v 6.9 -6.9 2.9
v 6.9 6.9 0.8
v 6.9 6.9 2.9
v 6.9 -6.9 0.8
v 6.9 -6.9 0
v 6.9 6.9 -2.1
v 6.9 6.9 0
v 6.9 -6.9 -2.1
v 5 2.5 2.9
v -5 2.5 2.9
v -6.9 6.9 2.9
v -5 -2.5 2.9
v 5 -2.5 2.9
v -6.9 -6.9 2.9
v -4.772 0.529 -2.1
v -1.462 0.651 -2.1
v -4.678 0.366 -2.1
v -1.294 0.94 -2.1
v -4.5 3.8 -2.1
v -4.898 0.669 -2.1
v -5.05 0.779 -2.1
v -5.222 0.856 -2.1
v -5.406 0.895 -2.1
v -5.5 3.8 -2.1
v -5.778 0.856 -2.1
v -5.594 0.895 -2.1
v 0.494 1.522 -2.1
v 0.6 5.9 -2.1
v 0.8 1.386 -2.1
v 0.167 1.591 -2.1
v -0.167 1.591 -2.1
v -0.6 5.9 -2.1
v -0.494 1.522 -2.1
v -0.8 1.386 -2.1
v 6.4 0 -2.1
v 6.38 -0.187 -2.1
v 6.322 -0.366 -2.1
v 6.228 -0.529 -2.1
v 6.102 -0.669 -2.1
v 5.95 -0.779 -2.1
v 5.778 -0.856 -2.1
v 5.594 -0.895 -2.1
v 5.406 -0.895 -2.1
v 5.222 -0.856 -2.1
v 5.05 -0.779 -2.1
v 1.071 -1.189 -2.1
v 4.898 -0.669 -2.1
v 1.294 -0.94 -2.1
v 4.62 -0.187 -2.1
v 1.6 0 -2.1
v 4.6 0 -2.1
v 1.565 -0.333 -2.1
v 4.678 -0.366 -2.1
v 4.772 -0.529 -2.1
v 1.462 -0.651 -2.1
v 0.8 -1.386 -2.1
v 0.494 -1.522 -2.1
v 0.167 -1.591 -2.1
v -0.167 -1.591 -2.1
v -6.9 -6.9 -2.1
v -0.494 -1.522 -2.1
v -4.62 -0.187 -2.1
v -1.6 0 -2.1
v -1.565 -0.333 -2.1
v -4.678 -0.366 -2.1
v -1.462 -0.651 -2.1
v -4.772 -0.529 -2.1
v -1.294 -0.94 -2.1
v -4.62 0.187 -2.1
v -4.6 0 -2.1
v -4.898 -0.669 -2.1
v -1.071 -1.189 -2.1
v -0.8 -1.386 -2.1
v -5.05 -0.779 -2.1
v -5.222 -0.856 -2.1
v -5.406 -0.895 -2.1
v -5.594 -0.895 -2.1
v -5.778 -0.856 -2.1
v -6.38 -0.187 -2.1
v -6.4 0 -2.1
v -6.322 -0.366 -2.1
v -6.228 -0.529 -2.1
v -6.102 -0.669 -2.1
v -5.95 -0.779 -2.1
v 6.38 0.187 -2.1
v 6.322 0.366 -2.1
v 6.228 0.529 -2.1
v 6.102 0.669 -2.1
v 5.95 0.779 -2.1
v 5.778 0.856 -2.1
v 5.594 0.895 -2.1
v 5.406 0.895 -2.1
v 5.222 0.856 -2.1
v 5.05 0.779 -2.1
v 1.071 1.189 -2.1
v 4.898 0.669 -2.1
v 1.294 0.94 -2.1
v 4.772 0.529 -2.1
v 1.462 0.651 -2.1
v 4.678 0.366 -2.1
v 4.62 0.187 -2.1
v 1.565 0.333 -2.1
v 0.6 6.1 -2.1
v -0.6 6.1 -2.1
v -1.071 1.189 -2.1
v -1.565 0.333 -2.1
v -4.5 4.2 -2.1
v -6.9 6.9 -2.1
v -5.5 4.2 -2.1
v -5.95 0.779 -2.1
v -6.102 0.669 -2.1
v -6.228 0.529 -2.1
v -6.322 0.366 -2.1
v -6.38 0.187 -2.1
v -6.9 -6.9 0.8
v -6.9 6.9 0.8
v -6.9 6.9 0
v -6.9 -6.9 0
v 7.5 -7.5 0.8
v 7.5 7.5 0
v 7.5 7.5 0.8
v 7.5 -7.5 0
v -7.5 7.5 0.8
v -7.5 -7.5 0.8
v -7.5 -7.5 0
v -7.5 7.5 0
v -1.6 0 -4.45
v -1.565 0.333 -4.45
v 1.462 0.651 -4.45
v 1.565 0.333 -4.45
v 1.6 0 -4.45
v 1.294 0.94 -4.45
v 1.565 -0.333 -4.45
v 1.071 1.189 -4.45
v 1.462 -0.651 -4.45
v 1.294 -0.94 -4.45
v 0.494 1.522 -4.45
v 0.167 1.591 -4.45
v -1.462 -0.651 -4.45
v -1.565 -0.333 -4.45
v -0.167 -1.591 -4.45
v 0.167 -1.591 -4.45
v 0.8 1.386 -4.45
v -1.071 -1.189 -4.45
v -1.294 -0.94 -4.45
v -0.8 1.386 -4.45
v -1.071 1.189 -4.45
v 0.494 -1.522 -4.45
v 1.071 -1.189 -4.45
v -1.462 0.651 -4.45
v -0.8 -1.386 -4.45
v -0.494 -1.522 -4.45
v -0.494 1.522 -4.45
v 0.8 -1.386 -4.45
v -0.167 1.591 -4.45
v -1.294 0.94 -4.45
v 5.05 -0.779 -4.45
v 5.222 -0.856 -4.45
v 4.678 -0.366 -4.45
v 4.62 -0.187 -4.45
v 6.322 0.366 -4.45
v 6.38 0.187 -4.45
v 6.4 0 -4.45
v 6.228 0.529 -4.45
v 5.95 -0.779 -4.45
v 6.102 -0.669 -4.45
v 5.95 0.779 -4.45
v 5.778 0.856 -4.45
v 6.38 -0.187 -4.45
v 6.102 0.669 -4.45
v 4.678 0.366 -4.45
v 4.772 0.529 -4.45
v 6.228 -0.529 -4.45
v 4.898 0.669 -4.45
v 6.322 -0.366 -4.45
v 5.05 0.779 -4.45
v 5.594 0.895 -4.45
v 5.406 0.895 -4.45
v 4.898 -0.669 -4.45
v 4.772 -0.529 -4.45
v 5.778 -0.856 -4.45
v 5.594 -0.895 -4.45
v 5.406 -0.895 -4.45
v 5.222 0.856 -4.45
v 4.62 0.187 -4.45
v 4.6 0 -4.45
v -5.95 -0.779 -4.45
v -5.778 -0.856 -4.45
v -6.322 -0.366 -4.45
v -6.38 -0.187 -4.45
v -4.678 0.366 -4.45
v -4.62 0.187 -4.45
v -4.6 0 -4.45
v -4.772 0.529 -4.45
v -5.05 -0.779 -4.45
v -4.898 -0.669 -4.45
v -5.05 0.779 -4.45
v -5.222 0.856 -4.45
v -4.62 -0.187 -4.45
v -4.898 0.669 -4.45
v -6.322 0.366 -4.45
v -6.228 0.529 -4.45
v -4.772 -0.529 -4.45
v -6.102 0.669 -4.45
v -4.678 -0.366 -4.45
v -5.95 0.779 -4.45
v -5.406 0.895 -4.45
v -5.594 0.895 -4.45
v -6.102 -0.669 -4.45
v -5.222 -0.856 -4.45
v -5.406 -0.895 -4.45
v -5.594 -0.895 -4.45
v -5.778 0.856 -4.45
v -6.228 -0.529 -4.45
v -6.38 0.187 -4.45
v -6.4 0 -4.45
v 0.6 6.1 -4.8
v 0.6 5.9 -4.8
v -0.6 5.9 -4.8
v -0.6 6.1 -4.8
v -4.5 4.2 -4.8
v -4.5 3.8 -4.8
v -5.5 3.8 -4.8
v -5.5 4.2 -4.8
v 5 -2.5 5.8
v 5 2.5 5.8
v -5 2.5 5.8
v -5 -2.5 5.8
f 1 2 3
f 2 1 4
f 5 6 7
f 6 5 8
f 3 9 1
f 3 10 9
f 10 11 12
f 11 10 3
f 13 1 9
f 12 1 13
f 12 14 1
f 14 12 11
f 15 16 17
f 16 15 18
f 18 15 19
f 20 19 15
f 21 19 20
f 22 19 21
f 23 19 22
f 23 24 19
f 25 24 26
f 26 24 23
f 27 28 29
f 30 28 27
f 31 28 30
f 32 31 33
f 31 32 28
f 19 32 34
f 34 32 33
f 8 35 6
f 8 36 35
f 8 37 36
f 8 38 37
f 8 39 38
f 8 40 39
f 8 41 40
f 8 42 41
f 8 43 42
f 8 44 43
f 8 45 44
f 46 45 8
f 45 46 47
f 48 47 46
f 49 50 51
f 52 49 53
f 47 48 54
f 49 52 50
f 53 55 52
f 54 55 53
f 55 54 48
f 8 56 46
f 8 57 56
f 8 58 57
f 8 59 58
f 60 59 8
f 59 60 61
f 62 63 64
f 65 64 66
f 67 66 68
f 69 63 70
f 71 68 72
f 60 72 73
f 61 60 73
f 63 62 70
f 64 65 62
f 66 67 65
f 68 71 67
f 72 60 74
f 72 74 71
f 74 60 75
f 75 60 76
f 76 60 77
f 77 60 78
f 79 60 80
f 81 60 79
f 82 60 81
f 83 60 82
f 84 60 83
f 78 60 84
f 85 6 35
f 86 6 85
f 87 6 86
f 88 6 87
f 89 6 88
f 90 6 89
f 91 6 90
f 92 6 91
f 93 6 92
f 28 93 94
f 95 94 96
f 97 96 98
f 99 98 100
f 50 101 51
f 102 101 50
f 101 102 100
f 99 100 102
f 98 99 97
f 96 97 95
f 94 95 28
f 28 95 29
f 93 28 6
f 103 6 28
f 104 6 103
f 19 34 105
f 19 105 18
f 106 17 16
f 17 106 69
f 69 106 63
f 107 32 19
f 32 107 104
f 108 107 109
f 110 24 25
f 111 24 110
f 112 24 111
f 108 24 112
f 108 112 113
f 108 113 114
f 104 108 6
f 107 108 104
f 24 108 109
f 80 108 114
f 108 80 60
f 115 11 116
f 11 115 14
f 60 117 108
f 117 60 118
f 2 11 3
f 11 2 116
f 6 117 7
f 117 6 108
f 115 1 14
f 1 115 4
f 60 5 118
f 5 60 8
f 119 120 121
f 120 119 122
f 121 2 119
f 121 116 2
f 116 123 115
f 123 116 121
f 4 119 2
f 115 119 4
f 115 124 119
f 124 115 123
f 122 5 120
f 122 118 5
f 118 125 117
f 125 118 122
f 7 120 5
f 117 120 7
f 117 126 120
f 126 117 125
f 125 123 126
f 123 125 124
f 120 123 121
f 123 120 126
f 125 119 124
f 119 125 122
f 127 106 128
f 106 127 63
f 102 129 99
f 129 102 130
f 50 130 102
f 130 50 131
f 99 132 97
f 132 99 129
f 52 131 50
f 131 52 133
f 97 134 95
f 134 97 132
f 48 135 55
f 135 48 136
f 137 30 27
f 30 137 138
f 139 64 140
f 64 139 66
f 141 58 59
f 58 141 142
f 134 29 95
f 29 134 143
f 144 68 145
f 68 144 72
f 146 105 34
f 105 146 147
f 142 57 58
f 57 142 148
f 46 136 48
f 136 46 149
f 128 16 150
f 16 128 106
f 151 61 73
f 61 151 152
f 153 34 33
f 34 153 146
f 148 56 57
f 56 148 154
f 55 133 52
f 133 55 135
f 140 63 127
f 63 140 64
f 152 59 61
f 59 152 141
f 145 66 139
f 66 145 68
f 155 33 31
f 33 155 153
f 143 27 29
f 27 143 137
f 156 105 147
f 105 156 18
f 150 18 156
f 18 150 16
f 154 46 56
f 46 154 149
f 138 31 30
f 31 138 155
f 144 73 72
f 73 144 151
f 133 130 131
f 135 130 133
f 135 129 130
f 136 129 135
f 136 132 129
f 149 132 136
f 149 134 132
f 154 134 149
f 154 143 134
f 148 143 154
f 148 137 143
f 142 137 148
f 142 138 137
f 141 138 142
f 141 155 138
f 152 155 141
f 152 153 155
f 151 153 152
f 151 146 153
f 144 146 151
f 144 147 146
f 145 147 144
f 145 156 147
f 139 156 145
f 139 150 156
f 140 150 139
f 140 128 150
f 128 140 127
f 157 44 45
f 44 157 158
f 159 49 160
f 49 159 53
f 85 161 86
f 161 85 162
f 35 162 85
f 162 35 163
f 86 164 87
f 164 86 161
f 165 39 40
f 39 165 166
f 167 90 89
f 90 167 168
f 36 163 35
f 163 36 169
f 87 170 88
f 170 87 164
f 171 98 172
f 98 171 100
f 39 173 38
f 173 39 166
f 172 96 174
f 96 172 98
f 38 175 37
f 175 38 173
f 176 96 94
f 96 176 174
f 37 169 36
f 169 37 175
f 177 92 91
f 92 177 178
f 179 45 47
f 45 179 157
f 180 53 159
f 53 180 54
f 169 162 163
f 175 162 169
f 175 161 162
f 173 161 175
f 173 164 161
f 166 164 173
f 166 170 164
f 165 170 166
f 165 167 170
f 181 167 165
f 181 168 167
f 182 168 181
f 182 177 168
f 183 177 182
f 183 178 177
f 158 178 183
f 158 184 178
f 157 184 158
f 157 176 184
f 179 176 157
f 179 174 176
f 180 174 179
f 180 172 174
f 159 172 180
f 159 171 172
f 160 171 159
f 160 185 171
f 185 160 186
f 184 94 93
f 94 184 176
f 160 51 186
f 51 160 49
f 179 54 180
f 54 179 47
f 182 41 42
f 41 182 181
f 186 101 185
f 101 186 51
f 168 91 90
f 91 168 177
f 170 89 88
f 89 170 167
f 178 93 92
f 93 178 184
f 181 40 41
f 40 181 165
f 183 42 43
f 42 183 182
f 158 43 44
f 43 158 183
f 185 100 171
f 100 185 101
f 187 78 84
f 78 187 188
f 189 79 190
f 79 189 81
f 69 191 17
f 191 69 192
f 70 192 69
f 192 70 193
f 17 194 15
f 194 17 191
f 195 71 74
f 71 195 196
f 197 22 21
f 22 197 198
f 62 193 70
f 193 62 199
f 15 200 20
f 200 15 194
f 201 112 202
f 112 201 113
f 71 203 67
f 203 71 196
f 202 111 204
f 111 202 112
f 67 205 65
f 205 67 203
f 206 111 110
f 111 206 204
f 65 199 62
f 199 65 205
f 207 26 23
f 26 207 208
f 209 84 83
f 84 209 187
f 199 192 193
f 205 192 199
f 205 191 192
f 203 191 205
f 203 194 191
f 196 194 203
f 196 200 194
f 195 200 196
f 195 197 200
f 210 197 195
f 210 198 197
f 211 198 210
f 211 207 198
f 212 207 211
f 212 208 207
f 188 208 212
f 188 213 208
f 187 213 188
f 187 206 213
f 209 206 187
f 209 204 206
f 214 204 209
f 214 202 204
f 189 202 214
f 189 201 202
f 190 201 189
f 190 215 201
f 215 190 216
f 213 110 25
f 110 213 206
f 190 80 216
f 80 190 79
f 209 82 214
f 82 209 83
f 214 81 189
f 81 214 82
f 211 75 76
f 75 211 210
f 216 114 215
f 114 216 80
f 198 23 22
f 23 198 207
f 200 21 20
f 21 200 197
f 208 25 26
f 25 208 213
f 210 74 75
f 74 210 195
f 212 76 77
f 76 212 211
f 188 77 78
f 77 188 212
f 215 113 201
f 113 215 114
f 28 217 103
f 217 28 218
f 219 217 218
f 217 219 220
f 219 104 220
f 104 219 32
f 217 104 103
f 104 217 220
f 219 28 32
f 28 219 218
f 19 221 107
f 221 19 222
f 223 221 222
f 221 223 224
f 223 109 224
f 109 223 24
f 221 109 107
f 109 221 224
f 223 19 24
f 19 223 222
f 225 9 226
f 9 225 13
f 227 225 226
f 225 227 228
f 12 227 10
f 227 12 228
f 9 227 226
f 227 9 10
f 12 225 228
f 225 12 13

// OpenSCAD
$fn=30;

module choc() {
    translate([0,0,2.9]) cube([10, 5, 5.8], center=true);
    translate([0,0,0.4]){
        cube([13.8, 13.8, 5.0], center=true);
        cube([15.0, 15.0, 0.8], center=true);
        translate([0,0,-4.85]) cylinder(d=3.2, h=4.85);

        translate([5.5,0,-4.85]) cylinder(d=1.8, h=4.85);
        translate([-5.5,0,-4.85]) cylinder(d=1.8, h=4.85);

        translate([-0.6,5.9,-5.2]) cube([1.2,0.2,5.2]);
        translate([-5.5,3.8,-5.2]) cube([1.0,0.4,5.2]);
    }
}

choc();
